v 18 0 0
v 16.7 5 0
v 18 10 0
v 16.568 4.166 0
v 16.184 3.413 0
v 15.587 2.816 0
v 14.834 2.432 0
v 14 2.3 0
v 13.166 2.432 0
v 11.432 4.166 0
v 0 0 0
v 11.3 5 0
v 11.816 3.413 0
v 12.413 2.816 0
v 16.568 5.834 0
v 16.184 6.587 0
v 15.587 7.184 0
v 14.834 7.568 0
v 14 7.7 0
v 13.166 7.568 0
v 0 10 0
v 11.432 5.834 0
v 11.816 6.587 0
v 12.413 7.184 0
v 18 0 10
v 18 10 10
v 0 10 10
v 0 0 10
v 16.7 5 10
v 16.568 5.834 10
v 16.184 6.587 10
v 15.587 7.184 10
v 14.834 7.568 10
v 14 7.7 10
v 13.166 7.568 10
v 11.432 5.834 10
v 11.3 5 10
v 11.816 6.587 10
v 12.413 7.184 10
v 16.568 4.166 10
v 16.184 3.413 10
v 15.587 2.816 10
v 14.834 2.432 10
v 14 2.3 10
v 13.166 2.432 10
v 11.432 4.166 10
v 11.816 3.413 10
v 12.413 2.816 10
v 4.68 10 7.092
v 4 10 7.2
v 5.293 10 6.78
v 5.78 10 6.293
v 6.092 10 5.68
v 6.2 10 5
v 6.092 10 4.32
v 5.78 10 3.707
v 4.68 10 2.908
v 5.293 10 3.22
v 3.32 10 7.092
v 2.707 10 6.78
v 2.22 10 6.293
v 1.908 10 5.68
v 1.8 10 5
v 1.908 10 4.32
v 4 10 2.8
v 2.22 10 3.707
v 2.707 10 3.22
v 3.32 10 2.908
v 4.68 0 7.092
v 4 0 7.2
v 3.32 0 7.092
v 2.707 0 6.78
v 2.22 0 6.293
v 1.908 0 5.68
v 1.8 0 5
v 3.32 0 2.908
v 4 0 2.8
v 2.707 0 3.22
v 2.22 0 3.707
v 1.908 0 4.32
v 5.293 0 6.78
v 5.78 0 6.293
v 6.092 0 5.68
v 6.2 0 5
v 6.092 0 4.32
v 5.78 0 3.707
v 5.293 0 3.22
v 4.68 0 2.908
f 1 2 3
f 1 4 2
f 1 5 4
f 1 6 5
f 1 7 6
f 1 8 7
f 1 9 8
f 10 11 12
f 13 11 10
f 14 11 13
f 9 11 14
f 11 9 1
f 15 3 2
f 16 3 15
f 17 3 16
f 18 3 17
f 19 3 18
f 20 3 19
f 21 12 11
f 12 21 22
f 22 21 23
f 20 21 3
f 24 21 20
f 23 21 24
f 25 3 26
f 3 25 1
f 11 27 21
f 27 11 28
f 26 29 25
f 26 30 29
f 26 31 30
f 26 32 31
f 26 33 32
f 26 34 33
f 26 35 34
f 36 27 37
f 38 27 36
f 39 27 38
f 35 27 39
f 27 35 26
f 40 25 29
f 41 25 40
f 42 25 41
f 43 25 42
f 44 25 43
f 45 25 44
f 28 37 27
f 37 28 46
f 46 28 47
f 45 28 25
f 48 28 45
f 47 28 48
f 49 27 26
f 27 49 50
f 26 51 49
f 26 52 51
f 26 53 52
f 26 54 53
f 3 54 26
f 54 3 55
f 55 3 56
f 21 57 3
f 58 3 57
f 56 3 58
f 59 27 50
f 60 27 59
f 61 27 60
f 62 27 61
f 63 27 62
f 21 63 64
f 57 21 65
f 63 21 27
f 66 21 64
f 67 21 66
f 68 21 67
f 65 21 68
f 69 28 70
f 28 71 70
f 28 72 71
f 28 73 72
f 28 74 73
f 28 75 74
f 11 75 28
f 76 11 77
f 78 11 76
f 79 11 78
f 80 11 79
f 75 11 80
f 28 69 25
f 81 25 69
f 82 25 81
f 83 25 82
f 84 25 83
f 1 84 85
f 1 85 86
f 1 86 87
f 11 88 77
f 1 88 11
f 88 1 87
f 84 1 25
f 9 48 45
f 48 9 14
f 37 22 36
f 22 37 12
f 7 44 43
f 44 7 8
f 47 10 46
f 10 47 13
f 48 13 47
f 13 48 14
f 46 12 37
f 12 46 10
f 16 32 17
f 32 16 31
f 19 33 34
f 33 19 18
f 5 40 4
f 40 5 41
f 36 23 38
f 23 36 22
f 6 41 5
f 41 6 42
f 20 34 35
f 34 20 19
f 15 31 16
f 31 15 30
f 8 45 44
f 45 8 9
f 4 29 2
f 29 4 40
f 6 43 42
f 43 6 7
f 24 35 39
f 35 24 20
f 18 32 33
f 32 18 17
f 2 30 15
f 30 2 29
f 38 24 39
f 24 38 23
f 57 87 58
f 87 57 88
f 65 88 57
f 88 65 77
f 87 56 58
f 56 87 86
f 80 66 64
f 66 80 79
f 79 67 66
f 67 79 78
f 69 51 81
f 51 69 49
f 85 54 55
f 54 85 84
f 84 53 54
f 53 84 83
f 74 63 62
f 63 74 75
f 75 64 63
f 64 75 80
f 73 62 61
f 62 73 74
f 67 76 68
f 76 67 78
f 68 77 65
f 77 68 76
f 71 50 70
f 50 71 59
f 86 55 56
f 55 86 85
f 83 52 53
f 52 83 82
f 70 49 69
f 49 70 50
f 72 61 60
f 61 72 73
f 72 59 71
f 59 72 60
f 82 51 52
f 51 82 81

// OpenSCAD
r1 = 2.5 + 0.2;
r2 = 2.0 + 0.2;

x1 = 10;
y1 = 10;
za1 = 4.0;
za2 = za1 + 10;
z1 =  za2 + 4.0;

$fn=20;

// include <atu_supports.scad>
//include <atu_nut_axis.scad>


module ax_ho_21x()
{
  difference() {
    cube( [x1,y1,z1] );
    translate([ 0,y1/2,za2]) rotate([0,90,0]) cylinder( r=r1, h=x1 );
    translate([ x1/2,y1,za1])  rotate([90,0,0]) cylinder( r=r2, h=y1 );
  }
}

// ax_ho_21x();
translate([0,0,x1])
rotate([0,90,0]) ax_ho_21x();
